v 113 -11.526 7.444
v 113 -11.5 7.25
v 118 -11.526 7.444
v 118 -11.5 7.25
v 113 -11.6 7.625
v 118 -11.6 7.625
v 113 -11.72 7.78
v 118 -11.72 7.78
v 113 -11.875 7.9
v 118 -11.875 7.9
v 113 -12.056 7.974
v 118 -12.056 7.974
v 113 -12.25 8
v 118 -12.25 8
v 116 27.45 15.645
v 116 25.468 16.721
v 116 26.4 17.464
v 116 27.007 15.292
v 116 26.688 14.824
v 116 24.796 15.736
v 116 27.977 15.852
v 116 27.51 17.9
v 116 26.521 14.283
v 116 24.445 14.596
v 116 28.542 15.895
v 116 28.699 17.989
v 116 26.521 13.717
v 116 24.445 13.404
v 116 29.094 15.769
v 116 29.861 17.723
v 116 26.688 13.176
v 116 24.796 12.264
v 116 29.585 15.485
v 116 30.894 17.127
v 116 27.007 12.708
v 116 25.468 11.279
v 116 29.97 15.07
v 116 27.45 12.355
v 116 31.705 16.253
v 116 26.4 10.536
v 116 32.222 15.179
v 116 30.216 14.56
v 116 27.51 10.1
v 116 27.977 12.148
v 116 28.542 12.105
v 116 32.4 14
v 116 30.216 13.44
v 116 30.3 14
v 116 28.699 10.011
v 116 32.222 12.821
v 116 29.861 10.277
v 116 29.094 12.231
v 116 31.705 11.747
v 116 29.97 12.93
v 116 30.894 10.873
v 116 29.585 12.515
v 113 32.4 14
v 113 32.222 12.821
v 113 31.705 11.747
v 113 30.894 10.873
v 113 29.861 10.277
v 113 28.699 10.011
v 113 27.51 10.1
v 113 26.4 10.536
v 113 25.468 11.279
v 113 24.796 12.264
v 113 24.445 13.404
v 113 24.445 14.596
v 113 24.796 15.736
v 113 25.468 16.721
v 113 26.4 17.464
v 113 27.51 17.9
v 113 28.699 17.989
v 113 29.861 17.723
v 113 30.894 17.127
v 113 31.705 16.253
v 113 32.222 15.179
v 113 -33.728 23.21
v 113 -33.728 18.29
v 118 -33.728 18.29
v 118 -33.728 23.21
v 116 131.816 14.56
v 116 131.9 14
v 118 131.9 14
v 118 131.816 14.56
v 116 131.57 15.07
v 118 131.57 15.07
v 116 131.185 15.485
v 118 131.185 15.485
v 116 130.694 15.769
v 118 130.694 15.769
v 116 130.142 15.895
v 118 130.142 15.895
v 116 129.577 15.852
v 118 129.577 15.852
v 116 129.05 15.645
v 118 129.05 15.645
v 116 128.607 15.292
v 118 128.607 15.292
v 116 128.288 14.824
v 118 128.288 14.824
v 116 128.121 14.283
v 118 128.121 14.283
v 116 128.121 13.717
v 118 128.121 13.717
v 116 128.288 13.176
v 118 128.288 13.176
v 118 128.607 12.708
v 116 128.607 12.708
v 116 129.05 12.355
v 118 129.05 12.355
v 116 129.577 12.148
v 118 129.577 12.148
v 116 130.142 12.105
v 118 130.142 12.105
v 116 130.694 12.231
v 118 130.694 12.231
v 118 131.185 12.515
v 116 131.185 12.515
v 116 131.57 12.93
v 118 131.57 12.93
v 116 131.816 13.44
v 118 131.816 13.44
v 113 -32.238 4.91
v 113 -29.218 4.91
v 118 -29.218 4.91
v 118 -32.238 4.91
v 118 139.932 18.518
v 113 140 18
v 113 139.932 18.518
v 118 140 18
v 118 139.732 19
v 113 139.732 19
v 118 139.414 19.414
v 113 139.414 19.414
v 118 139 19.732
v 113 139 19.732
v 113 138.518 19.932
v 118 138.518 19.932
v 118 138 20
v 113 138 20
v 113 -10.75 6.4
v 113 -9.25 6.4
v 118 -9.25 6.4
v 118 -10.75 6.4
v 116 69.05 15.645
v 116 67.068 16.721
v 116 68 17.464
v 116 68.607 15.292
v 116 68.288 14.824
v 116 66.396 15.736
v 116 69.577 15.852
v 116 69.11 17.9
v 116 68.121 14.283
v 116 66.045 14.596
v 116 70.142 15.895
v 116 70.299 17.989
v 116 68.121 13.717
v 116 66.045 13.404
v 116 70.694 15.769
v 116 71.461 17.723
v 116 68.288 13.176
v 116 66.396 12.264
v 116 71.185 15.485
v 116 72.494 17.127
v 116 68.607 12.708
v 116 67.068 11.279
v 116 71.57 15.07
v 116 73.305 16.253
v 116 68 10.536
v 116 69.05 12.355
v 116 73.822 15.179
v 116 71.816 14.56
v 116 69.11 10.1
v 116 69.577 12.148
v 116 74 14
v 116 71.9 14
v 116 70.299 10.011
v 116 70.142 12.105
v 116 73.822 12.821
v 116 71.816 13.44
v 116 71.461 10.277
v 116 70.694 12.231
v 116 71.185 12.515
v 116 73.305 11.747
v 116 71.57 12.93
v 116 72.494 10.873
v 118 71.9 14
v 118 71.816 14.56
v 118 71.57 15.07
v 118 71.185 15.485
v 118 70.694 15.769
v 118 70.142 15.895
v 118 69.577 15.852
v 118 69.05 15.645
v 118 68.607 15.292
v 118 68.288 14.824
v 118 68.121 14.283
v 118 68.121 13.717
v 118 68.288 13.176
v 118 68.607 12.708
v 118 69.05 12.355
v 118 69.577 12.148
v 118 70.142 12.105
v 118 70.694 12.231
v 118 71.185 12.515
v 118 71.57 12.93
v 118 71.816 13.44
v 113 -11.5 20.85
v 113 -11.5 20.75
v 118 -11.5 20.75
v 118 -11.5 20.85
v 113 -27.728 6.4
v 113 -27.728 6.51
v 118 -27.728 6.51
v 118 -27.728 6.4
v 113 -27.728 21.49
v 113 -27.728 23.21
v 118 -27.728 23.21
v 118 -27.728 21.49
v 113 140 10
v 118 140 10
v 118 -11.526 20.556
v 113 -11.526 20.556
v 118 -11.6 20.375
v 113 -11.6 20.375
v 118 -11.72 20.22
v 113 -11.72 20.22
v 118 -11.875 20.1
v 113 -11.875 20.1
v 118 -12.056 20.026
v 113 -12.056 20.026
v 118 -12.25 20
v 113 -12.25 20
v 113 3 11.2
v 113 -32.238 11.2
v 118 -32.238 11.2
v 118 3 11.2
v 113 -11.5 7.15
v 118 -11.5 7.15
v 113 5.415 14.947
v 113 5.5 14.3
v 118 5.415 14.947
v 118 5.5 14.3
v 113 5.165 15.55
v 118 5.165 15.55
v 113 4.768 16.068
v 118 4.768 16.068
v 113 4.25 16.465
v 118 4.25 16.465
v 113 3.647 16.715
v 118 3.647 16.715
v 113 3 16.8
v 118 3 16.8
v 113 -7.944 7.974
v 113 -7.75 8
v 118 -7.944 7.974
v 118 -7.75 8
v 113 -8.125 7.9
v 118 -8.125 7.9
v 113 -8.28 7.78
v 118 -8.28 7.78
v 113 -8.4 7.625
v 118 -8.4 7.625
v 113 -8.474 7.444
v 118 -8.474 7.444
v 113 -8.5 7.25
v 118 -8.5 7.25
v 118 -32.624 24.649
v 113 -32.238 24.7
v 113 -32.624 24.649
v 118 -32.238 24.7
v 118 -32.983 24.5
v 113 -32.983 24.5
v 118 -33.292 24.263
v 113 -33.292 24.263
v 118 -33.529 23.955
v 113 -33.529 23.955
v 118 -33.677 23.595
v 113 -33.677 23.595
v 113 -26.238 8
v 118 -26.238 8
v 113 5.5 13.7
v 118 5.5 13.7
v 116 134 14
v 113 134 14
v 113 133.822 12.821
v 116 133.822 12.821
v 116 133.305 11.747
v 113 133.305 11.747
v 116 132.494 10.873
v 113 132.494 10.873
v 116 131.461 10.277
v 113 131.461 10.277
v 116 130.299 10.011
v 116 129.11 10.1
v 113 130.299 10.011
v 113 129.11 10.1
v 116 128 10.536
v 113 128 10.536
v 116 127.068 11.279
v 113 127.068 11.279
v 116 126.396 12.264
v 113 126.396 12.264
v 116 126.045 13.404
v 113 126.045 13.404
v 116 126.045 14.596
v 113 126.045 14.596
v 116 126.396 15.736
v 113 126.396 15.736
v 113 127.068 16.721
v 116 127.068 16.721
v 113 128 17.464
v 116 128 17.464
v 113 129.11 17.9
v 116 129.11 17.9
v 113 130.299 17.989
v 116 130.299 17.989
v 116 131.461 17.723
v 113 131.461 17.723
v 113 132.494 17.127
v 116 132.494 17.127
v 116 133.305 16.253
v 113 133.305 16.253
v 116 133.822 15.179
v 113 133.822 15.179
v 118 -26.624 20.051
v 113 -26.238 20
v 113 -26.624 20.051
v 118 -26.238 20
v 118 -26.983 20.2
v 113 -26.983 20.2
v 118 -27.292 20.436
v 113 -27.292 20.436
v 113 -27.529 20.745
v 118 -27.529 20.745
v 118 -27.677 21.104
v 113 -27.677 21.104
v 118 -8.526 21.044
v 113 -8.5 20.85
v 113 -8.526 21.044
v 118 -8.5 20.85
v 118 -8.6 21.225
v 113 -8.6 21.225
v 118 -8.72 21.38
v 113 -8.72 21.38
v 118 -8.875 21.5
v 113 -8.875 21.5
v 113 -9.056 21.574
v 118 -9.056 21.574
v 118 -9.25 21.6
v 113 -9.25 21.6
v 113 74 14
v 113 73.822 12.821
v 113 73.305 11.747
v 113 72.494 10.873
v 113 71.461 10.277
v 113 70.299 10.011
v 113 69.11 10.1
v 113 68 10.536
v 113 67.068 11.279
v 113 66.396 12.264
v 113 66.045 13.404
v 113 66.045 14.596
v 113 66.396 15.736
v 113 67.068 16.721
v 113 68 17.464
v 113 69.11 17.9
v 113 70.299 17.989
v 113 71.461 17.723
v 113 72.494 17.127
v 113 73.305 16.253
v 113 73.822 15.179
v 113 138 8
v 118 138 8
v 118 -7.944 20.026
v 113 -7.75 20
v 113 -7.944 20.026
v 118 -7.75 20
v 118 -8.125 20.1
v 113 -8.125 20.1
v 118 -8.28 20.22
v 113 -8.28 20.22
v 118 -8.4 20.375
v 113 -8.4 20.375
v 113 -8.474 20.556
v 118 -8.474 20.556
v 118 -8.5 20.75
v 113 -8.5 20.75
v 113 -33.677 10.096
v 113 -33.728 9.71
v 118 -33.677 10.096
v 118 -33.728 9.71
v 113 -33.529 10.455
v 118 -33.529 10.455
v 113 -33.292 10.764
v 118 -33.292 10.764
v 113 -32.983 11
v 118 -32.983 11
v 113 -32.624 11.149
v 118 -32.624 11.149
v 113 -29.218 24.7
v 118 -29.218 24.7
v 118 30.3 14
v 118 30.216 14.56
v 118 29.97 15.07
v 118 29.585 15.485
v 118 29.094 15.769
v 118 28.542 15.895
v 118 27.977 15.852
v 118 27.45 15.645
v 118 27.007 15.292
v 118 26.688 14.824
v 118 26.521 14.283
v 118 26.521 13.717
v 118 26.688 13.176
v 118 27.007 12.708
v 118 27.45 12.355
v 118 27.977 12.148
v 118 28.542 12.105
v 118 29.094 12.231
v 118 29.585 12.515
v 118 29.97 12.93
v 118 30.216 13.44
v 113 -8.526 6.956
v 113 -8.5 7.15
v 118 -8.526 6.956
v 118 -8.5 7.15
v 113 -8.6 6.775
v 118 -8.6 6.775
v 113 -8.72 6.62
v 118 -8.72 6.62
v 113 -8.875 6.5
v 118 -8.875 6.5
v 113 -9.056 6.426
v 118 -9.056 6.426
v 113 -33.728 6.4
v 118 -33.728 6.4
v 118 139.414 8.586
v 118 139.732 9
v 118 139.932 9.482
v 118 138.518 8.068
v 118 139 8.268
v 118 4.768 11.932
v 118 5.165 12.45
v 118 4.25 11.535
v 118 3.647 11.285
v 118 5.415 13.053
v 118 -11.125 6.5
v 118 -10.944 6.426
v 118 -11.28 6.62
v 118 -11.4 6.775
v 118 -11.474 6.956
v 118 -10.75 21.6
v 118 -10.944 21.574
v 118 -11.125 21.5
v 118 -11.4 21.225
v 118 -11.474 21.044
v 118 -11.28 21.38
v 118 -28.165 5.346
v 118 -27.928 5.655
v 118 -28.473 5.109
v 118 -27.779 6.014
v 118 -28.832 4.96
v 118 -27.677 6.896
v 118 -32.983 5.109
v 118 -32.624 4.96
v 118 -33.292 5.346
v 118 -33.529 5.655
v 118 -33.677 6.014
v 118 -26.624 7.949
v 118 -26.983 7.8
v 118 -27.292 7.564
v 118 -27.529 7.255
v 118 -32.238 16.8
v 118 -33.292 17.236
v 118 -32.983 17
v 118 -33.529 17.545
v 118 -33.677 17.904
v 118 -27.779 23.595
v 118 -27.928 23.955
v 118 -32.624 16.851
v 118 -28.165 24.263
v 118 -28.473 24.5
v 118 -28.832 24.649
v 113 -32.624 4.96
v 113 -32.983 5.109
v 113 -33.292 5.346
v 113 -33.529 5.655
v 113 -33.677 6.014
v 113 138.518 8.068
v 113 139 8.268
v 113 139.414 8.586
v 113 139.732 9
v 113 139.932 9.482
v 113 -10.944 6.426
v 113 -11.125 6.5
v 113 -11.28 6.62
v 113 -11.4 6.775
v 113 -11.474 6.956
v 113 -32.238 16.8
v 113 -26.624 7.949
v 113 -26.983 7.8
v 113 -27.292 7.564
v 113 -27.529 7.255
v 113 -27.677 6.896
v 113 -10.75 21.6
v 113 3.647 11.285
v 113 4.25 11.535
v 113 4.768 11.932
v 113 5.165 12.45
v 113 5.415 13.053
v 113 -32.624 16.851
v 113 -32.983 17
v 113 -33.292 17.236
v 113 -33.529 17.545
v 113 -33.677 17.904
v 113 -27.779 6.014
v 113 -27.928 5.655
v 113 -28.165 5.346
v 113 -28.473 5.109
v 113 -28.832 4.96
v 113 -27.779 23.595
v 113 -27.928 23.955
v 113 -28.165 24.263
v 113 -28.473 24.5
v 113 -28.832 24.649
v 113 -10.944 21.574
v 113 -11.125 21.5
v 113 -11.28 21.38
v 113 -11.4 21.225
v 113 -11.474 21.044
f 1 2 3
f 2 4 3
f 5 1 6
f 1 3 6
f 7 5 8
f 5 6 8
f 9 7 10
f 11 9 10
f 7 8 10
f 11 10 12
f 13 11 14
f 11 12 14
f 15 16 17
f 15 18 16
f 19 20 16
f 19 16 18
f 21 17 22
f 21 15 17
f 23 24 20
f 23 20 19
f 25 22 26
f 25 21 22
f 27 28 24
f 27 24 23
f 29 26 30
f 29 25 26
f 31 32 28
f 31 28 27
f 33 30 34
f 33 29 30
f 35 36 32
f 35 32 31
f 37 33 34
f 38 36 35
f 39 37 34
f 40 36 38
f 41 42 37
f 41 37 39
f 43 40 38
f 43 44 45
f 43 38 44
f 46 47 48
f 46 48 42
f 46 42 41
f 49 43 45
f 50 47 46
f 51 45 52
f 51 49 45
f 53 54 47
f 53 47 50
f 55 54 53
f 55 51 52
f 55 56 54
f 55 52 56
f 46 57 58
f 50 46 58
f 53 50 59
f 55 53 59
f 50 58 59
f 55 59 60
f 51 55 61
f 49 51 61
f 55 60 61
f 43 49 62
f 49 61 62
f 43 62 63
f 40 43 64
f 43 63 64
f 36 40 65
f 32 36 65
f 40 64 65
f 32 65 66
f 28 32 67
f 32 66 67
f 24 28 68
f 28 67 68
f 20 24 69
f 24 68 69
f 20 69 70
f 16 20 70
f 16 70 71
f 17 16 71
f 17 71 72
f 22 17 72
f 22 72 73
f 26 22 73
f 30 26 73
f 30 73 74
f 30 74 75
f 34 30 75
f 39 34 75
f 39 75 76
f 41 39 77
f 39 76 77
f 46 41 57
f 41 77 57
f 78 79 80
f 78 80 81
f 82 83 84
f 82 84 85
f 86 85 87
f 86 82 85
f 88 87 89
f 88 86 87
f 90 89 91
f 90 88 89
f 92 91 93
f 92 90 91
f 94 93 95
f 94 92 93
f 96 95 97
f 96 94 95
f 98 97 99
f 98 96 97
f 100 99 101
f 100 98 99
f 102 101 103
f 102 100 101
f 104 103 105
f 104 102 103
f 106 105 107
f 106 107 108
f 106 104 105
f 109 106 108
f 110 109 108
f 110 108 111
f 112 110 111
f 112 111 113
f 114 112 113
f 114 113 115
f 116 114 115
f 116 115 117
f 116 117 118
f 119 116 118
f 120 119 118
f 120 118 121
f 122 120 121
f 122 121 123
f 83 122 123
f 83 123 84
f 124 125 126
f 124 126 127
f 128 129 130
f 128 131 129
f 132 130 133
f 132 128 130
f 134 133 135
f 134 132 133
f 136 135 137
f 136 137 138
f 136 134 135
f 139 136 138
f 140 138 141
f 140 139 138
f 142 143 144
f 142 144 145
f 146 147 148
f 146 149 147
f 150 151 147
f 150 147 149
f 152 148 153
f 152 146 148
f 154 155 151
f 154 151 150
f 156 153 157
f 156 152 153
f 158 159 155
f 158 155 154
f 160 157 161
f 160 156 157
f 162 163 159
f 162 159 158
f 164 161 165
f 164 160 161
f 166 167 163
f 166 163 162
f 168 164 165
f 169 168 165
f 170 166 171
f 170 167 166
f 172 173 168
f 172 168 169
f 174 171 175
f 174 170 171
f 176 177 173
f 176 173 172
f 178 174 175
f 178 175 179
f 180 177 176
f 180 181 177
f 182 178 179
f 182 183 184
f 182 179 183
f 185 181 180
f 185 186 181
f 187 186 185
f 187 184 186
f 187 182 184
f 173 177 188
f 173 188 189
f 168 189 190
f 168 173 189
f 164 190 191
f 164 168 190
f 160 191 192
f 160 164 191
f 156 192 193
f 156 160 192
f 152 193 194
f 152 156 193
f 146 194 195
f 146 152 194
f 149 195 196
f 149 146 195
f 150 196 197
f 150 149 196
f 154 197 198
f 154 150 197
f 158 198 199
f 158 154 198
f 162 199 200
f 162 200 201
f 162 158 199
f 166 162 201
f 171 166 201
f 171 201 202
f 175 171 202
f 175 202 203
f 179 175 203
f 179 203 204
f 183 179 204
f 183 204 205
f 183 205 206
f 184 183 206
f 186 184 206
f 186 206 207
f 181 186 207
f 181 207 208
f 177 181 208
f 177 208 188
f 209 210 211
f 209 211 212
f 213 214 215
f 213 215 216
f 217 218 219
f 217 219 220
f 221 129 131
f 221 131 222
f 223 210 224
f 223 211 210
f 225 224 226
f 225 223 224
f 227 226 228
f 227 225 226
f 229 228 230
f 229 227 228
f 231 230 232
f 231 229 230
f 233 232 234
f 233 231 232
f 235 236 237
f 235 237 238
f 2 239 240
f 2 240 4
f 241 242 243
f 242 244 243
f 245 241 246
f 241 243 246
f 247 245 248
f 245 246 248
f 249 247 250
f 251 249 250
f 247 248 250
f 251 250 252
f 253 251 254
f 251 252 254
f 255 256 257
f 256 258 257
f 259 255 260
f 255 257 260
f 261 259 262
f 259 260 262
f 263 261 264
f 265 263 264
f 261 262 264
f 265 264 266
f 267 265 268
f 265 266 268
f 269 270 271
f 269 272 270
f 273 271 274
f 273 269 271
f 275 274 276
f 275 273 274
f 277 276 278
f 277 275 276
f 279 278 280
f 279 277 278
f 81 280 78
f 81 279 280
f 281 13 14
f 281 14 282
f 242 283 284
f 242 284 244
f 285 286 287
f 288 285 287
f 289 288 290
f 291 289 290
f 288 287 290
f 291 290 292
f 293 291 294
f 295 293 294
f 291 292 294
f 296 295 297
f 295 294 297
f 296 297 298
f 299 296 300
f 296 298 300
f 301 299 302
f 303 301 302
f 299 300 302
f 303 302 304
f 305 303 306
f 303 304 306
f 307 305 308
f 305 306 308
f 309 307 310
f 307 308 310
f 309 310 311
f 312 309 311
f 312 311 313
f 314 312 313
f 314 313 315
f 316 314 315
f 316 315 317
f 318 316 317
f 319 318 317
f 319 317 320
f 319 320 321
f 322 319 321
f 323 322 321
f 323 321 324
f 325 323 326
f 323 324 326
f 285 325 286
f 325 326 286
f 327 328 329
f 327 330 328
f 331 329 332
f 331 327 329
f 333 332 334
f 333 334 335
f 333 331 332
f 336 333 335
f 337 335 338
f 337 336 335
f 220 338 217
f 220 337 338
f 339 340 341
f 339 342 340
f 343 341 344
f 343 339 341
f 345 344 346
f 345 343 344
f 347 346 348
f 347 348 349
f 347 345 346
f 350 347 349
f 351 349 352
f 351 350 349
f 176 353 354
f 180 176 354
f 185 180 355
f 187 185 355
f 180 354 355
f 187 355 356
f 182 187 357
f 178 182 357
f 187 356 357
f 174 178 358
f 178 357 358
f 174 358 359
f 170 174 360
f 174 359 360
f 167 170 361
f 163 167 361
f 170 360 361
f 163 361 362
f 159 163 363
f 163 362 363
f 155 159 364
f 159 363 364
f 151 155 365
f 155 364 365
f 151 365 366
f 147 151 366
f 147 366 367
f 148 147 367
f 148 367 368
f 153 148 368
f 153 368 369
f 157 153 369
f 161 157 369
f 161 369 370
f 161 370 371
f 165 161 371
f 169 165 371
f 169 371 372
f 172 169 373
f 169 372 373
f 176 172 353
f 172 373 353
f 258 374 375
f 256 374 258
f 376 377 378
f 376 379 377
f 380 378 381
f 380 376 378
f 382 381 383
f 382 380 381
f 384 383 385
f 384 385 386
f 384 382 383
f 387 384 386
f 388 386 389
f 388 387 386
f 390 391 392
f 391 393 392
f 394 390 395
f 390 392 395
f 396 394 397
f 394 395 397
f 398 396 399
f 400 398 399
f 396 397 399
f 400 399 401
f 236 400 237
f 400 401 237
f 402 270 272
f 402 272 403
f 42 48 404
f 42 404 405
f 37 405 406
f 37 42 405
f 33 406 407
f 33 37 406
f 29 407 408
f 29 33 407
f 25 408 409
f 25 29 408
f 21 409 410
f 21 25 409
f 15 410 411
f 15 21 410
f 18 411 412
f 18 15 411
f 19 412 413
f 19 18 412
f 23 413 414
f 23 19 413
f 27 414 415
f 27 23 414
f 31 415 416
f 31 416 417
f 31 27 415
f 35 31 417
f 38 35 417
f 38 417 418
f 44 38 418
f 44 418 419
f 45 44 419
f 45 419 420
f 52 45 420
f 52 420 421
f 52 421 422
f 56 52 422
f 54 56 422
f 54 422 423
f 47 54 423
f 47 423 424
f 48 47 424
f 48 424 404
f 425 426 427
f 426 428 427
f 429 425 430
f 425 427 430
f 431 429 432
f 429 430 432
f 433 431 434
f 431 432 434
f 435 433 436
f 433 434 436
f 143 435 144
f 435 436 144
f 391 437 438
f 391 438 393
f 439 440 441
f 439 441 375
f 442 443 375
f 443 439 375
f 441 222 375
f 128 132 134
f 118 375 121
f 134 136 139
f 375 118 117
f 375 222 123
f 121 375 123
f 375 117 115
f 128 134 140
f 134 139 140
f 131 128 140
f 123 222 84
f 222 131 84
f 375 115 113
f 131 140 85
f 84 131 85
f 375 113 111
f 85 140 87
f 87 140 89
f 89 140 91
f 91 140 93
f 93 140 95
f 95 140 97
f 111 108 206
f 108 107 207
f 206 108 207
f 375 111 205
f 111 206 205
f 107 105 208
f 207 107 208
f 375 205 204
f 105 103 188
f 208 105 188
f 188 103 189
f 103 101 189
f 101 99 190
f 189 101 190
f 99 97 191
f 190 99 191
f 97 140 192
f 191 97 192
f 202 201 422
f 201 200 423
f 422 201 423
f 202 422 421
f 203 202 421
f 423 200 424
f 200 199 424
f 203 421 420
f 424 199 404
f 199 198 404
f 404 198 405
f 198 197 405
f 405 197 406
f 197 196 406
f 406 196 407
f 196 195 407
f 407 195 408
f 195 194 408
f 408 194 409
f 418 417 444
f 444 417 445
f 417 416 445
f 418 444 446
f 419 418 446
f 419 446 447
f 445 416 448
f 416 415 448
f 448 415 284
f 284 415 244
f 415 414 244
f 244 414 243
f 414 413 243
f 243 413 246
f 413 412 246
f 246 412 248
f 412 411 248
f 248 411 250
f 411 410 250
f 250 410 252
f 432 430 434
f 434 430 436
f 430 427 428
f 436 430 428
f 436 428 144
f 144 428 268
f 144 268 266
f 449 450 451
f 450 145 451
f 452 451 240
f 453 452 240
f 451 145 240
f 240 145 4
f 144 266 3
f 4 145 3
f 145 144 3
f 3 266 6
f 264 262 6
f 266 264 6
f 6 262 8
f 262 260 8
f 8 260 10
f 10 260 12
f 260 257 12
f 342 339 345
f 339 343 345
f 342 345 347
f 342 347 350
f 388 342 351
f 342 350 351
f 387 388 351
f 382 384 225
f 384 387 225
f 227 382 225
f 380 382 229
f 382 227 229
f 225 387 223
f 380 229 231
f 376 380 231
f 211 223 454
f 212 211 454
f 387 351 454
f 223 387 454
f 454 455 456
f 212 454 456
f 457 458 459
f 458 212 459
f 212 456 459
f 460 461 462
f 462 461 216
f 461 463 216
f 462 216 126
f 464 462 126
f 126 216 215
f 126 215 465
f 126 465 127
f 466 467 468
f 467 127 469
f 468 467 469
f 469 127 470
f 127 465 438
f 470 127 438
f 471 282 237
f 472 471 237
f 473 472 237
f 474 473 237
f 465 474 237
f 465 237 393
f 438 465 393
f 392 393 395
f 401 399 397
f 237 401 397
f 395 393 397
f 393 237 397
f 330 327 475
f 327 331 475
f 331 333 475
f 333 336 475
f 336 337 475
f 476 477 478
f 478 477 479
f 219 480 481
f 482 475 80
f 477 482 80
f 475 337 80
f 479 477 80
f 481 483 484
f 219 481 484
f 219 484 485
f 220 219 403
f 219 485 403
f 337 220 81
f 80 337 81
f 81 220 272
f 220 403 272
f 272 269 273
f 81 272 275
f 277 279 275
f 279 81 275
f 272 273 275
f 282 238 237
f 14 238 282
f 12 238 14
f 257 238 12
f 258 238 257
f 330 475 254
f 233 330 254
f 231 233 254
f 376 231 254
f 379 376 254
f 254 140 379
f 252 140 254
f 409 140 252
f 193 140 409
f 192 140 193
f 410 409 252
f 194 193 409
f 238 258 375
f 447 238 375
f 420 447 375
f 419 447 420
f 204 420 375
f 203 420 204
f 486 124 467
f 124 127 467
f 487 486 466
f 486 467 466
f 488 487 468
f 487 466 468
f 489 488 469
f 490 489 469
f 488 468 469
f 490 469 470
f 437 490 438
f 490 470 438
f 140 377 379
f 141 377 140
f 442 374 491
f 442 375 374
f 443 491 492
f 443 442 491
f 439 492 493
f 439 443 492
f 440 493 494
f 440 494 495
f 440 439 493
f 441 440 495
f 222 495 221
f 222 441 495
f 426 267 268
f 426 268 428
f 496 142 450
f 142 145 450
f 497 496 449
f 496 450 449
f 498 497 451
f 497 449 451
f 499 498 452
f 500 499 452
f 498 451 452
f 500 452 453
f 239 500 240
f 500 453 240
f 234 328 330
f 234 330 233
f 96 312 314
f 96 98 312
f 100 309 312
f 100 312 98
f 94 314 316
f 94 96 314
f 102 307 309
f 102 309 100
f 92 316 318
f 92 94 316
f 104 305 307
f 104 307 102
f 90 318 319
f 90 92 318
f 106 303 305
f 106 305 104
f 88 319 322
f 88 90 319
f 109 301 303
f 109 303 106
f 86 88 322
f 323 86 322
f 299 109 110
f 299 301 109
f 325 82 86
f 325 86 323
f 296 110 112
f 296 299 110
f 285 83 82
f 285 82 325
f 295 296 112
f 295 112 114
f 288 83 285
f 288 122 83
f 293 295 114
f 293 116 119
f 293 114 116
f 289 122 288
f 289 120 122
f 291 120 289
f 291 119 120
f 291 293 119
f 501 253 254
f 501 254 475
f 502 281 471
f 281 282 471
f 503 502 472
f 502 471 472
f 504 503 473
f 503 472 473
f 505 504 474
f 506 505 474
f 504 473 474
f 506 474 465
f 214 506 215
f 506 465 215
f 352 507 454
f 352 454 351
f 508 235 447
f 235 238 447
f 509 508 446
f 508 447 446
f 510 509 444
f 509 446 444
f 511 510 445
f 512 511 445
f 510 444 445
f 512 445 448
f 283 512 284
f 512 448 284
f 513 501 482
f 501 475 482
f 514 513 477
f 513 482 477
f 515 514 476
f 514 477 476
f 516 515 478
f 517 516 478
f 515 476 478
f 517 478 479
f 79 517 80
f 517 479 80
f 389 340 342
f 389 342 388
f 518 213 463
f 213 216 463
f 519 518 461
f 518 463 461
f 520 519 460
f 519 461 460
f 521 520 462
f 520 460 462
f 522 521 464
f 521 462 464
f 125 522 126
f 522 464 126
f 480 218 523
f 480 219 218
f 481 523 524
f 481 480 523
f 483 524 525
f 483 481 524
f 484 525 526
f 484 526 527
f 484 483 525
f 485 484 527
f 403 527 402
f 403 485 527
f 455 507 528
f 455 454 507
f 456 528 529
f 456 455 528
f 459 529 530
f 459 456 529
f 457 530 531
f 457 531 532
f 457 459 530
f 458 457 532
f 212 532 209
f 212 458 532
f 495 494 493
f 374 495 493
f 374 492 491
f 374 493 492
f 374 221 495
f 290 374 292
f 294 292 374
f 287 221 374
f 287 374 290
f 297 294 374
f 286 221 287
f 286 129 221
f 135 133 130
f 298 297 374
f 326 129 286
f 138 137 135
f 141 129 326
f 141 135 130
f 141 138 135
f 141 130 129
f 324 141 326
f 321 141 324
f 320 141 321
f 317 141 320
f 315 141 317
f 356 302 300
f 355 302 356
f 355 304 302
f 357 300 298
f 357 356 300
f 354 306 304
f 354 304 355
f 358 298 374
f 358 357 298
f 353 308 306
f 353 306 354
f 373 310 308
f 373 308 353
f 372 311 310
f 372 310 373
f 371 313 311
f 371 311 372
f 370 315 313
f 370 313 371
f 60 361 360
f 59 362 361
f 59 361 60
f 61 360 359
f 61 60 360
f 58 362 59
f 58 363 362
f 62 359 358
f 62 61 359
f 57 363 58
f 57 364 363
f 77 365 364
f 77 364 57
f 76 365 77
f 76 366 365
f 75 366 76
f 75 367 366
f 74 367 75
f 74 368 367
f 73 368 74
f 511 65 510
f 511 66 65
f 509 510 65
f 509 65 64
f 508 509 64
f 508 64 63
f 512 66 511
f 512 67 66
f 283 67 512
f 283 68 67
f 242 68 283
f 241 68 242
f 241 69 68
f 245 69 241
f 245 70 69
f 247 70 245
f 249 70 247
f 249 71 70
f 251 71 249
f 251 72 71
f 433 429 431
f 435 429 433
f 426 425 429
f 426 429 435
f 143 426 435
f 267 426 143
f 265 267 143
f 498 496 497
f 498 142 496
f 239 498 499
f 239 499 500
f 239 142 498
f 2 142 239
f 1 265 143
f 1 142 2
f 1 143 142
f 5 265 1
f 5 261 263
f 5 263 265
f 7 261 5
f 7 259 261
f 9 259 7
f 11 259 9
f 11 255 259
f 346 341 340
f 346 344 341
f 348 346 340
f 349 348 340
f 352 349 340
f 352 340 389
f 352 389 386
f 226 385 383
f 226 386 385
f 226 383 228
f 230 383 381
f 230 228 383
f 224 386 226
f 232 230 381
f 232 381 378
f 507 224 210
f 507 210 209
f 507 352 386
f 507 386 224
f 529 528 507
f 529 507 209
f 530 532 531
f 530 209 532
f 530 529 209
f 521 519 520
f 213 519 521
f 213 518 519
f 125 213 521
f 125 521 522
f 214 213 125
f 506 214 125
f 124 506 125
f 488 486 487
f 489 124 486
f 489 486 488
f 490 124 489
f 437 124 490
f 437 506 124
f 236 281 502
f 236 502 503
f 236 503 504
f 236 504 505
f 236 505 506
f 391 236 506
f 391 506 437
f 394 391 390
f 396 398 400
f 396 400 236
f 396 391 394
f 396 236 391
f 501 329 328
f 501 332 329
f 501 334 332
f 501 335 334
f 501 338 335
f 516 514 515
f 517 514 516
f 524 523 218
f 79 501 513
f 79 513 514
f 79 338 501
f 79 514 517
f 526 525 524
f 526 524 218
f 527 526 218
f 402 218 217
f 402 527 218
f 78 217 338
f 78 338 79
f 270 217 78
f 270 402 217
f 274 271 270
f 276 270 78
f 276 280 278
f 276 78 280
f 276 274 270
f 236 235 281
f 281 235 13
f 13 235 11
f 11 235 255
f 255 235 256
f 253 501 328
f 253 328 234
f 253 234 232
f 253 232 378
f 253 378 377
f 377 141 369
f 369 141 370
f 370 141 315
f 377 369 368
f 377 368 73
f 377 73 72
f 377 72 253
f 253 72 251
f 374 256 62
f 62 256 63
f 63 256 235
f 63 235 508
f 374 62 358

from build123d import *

# Parameters (mm, degrees)
SKETCH_R             = 1.9
PAD_DEPTH            = 5
SKETCH001_R          = 4
POCKET_DEPTH         = 3
FILLET_R             = 2
FILLET001_R          = 0.75
FILLET002_R          = 1.49
FILLET003_R          = 2.5
BODY_PLACEMENT_ANGLE = 270


with BuildPart() as part:
    # Sketch → Pad (new body)
    with BuildSketch(Plane.XZ):
        Polygon((4, 0), (-144.5, 0), (-144.5, -1.6), (-147.5, -1.6), (-147.5, 0), (-163.728138112, 0), (-163.728138112, -3.090405), (-169.728138112, -3.090405), (-169.728138112, 3.2), (-130.5, 3.2), (-130.5, 8.8), (-169.728138112, 8.8), (-169.728138112, 16.699631), (-163.728138112, 16.699631), (-163.728138112, 12), (-147.5, 12), (-147.5, 13.6), (-144.5, 13.6), (-144.5, 12), (4, 12), align=None)
        with Locations((-66, 6)):
            Circle(SKETCH_R, mode=Mode.SUBTRACT)
        with Locations((-6, 6)):
            Circle(SKETCH_R, mode=Mode.SUBTRACT)
        with Locations((-107.6, 6)):
            Circle(SKETCH_R, mode=Mode.SUBTRACT)
    extrude(amount=PAD_DEPTH)

    # Sketch001 (on Face24 of Pad) → Pocket (cut)
    with BuildSketch(Plane(origin=(0, 0, 0), x_dir=(1, 0, 0), z_dir=(0, 1, 0))):
        with Locations((-107.6, -6)):
            Circle(SKETCH001_R)
        with Locations((-66, -6)):
            Circle(SKETCH001_R)
        with Locations((-6, -6)):
            Circle(SKETCH001_R)
    extrude(amount=-POCKET_DEPTH, mode=Mode.SUBTRACT)

    # Fillet
    fillet_edges = [part.edges().sort_by_distance(p)[0] for p in [
        (4, -2.5, 12),
        (4, -2.5, 0),
    ]]
    fillet(fillet_edges, radius=FILLET_R)

    # Fillet001
    fillet001_edges = [part.edges().sort_by_distance(p)[0] for p in [
        (-147.5, -2.5, 12),
        (-147.5, -2.5, 13.6),
        (-144.5, -2.5, 13.6),
        (-144.5, -2.5, 12),
        (-144.5, -2.5, -1.6),
        (-147.5, -2.5, 0),
        (-147.5, -2.5, -1.6),
        (-144.5, -2.5, 0),
    ]]
    fillet(fillet001_edges, radius=FILLET001_R)

    # Fillet002
    fillet002_edges = [part.edges().sort_by_distance(p)[0] for p in [
        (-163.728138, -2.5, 0),
        (-163.728138, -2.5, -3.090405),
        (-169.728138, -2.5, -3.090405),
        (-169.728138, -2.5, 3.2),
        (-169.728138, -2.5, 16.699631),
        (-163.728138, -2.5, 16.699631),
        (-163.728138, -2.5, 12),
        (-169.728138, -2.5, 8.8),
    ]]
    fillet(fillet002_edges, radius=FILLET002_R)

    # Fillet003
    fillet003_edges = [part.edges().sort_by_distance(p)[0] for p in [
        (-130.5, -2.5, 8.8),
        (-130.5, -2.5, 3.2),
    ]]
    fillet(fillet003_edges, radius=FILLET003_R)


with BuildPart() as part_1:
    # Body placement: moved
    add(part.part.moved(Location((113, 136, 8))).rotate(Axis((113, 136, 8), (0, 0, -1)), BODY_PLACEMENT_ANGLE))


solid = part_1.part
